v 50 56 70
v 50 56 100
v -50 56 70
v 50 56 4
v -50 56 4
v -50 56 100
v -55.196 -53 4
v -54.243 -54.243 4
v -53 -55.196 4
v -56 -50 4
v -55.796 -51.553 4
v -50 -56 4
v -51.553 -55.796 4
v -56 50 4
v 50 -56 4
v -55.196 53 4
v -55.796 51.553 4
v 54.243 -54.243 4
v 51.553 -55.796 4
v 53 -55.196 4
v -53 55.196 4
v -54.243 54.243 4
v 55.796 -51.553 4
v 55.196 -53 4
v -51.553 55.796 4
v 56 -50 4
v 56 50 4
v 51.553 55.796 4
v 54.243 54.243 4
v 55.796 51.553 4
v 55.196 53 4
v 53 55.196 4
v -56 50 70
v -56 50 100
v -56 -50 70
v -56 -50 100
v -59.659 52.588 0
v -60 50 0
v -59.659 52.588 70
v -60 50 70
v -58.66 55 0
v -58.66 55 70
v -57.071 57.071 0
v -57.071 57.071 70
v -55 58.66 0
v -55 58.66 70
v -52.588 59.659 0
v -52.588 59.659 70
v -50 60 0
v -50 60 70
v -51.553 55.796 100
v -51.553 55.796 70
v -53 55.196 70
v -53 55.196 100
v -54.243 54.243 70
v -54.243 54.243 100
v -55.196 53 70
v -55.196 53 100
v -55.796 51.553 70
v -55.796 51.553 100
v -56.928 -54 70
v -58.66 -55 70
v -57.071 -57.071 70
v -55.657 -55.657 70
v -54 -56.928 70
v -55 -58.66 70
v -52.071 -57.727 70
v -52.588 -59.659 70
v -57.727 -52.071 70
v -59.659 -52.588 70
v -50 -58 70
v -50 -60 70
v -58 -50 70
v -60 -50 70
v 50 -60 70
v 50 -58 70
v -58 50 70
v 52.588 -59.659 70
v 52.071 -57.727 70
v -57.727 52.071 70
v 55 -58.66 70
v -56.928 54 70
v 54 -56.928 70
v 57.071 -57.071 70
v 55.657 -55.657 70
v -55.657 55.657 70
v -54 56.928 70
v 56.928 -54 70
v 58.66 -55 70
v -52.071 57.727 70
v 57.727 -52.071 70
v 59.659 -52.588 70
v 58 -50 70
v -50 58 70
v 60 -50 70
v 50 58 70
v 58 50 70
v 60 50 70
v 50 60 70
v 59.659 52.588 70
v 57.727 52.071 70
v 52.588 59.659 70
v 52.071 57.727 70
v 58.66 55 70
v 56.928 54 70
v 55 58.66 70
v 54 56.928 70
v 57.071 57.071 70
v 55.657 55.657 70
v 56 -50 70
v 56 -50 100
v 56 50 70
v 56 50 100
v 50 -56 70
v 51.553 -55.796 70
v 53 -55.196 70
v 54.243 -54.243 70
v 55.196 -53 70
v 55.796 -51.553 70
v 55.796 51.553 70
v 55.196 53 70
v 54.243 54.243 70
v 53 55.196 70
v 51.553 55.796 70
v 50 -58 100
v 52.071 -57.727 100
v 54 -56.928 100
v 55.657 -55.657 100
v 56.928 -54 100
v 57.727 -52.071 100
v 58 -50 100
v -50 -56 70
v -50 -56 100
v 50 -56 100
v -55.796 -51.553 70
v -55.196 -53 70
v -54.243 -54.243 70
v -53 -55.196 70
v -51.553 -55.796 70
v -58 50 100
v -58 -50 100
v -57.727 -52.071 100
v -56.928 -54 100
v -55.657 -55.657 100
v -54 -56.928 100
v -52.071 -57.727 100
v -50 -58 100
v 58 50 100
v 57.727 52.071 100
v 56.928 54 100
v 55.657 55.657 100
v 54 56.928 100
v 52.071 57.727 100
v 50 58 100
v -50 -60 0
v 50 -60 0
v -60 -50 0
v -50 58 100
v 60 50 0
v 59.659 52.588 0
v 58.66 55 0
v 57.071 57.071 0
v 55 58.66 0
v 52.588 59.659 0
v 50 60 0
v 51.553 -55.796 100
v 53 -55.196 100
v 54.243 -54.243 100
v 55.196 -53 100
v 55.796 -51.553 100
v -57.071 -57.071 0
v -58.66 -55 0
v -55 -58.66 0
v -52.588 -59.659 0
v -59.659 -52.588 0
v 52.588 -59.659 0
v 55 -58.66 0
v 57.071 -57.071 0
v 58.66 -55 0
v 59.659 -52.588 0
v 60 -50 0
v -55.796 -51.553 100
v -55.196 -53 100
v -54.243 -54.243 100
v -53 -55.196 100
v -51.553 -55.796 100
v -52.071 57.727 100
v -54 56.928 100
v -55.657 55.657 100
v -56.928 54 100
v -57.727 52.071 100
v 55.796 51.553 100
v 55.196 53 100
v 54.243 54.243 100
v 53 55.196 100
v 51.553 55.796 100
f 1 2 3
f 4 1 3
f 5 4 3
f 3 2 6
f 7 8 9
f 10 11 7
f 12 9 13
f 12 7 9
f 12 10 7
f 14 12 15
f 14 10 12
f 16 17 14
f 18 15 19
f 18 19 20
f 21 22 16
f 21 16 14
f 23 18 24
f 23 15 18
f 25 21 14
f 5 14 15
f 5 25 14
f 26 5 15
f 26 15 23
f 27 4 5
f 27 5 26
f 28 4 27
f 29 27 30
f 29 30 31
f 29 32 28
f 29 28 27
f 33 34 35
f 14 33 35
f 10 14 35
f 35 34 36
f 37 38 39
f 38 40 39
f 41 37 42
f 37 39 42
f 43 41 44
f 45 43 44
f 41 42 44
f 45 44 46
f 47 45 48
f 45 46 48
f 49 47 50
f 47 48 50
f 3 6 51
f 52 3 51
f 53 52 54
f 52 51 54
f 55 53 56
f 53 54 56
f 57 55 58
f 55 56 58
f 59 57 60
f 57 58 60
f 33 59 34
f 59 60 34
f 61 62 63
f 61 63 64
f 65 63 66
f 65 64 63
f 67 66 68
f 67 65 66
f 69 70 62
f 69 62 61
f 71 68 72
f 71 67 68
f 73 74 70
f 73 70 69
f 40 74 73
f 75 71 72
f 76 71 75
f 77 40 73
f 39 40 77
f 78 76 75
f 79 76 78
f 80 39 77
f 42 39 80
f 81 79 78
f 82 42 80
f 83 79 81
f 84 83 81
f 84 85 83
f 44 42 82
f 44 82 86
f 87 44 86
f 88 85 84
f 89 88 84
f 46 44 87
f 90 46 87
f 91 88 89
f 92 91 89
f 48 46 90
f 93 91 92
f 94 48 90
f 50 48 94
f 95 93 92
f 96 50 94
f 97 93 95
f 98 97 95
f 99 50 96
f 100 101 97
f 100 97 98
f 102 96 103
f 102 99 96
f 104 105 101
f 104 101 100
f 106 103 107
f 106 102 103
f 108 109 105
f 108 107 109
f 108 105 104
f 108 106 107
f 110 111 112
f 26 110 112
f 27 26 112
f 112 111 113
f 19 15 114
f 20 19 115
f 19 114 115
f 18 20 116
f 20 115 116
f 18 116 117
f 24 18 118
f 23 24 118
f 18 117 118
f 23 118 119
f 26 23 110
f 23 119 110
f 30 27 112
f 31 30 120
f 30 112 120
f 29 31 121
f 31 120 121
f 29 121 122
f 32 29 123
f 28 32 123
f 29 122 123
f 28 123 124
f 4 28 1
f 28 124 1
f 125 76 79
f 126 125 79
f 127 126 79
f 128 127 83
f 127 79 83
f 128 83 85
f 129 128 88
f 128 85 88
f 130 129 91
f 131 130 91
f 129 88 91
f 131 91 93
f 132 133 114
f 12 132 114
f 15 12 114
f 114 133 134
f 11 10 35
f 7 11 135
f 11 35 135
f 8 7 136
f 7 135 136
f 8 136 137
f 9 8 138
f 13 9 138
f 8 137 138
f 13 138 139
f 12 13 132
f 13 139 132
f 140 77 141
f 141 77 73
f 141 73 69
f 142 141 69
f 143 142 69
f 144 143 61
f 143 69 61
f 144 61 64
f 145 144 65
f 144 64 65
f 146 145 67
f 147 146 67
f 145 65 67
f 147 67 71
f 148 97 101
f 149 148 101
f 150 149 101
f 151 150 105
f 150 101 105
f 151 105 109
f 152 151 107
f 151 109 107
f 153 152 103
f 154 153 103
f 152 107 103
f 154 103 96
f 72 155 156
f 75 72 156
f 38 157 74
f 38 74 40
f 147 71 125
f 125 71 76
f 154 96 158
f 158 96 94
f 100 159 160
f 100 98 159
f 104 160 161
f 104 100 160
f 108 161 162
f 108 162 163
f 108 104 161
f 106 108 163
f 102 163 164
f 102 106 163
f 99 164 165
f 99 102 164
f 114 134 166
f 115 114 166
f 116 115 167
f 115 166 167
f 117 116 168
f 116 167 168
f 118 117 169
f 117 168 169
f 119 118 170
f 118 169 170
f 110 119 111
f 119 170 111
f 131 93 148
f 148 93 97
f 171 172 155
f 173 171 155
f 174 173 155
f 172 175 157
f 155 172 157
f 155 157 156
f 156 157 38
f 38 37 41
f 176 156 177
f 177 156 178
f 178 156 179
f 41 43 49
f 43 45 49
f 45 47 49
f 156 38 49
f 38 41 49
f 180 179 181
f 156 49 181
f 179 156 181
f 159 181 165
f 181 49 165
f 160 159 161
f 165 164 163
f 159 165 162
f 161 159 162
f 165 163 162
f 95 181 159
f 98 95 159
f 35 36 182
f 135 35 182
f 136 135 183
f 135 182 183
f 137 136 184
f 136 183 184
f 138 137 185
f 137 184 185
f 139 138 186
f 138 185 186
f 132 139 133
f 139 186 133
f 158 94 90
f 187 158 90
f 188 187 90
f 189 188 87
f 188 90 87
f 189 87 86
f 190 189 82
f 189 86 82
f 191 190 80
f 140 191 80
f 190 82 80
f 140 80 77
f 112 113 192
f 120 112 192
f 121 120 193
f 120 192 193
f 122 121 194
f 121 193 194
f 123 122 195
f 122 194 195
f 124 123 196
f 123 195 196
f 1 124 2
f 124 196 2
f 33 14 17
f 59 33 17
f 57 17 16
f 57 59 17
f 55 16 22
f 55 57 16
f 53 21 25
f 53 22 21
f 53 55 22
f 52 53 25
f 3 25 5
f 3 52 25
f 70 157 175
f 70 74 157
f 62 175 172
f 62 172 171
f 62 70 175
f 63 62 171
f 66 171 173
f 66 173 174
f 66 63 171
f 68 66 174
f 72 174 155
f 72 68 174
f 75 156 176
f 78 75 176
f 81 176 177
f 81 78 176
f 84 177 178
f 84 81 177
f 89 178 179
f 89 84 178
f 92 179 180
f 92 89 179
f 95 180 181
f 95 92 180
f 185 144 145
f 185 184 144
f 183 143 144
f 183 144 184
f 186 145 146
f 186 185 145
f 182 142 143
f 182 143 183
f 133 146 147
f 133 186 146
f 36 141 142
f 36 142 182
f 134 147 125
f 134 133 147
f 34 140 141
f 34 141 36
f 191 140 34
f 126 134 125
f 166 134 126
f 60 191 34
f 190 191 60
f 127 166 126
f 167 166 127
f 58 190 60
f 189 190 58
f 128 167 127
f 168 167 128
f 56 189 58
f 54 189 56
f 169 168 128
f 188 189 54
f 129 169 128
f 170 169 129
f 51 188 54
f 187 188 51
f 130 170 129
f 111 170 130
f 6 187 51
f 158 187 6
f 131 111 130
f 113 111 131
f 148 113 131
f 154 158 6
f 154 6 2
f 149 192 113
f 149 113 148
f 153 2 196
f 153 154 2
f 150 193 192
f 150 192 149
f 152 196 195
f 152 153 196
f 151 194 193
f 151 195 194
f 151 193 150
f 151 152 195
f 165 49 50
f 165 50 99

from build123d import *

# Parameters (mm, degrees)
SKETCH1_W           = 120
SKETCH1_H           = 120
BOSS_EXTRUDE2_DEPTH = 70
FILLET1_R           = 10
SHELL2_T            = -4
BOSS_EXTRUDE3_DEPTH = 30
CUT_EXTRUDE9_DEPTH  = 30


with BuildPart() as part:
    # Sketch1 → Boss-Extrude2 (new body)
    with BuildSketch(Plane.XY):
        Rectangle(SKETCH1_W, SKETCH1_H)
    extrude(amount=BOSS_EXTRUDE2_DEPTH)

    # Fillet1
    fillet1_edges = [part.edges().sort_by_distance(p)[0] for p in [
        (60, -60, 35),
        (-60, -60, 35),
        (-60, 60, 35),
        (60, 60, 35),
    ]]
    fillet(fillet1_edges, radius=FILLET1_R)

    # Shell2
    shell2_openings = [part.faces().sort_by_distance(p)[0] for p in [
        (0, 0, 70),
    ]]
    offset(amount=SHELL2_T, openings=shell2_openings, kind=Kind.INTERSECTION)

    # Sketch12 → Boss-Extrude3 (add)
    with BuildSketch(Plane.XY.offset(70)):
        with BuildLine():
            Line((-58, 50), (-58, -50))
            ThreePointArc((-58, -50), (-55.656854249, -55.656854249), (-50, -58))
            Line((-50, -58), (50, -58))
            ThreePointArc((50, -58), (55.656854249, -55.656854249), (58, -50))
            Line((58, -50), (58, 50))
            ThreePointArc((58, 50), (55.656854249, 55.656854249), (50, 58))
            Line((50, 58), (-50, 58))
            ThreePointArc((-50, 58), (-55.656854249, 55.656854249), (-58, 50))
        make_face()
    extrude(amount=BOSS_EXTRUDE3_DEPTH)

    # Sketch14 → Cut-Extrude9 (cut)
    with BuildSketch(Plane.XY.offset(100)):
        with BuildLine():
            Line((50, 56), (-50, 56))
            ThreePointArc((-50, 56), (-54.242640687, 54.242640687), (-56, 50))
            Line((-56, 50), (-56, -50))
            ThreePointArc((-56, -50), (-54.242640687, -54.242640687), (-50, -56))
            Line((-50, -56), (50, -56))
            ThreePointArc((50, -56), (54.242640687, -54.242640687), (56, -50))
            Line((56, -50), (56, 50))
            ThreePointArc((56, 50), (54.242640687, 54.242640687), (50, 56))
        make_face()
    extrude(amount=-CUT_EXTRUDE9_DEPTH, mode=Mode.SUBTRACT)


solid = part.part
